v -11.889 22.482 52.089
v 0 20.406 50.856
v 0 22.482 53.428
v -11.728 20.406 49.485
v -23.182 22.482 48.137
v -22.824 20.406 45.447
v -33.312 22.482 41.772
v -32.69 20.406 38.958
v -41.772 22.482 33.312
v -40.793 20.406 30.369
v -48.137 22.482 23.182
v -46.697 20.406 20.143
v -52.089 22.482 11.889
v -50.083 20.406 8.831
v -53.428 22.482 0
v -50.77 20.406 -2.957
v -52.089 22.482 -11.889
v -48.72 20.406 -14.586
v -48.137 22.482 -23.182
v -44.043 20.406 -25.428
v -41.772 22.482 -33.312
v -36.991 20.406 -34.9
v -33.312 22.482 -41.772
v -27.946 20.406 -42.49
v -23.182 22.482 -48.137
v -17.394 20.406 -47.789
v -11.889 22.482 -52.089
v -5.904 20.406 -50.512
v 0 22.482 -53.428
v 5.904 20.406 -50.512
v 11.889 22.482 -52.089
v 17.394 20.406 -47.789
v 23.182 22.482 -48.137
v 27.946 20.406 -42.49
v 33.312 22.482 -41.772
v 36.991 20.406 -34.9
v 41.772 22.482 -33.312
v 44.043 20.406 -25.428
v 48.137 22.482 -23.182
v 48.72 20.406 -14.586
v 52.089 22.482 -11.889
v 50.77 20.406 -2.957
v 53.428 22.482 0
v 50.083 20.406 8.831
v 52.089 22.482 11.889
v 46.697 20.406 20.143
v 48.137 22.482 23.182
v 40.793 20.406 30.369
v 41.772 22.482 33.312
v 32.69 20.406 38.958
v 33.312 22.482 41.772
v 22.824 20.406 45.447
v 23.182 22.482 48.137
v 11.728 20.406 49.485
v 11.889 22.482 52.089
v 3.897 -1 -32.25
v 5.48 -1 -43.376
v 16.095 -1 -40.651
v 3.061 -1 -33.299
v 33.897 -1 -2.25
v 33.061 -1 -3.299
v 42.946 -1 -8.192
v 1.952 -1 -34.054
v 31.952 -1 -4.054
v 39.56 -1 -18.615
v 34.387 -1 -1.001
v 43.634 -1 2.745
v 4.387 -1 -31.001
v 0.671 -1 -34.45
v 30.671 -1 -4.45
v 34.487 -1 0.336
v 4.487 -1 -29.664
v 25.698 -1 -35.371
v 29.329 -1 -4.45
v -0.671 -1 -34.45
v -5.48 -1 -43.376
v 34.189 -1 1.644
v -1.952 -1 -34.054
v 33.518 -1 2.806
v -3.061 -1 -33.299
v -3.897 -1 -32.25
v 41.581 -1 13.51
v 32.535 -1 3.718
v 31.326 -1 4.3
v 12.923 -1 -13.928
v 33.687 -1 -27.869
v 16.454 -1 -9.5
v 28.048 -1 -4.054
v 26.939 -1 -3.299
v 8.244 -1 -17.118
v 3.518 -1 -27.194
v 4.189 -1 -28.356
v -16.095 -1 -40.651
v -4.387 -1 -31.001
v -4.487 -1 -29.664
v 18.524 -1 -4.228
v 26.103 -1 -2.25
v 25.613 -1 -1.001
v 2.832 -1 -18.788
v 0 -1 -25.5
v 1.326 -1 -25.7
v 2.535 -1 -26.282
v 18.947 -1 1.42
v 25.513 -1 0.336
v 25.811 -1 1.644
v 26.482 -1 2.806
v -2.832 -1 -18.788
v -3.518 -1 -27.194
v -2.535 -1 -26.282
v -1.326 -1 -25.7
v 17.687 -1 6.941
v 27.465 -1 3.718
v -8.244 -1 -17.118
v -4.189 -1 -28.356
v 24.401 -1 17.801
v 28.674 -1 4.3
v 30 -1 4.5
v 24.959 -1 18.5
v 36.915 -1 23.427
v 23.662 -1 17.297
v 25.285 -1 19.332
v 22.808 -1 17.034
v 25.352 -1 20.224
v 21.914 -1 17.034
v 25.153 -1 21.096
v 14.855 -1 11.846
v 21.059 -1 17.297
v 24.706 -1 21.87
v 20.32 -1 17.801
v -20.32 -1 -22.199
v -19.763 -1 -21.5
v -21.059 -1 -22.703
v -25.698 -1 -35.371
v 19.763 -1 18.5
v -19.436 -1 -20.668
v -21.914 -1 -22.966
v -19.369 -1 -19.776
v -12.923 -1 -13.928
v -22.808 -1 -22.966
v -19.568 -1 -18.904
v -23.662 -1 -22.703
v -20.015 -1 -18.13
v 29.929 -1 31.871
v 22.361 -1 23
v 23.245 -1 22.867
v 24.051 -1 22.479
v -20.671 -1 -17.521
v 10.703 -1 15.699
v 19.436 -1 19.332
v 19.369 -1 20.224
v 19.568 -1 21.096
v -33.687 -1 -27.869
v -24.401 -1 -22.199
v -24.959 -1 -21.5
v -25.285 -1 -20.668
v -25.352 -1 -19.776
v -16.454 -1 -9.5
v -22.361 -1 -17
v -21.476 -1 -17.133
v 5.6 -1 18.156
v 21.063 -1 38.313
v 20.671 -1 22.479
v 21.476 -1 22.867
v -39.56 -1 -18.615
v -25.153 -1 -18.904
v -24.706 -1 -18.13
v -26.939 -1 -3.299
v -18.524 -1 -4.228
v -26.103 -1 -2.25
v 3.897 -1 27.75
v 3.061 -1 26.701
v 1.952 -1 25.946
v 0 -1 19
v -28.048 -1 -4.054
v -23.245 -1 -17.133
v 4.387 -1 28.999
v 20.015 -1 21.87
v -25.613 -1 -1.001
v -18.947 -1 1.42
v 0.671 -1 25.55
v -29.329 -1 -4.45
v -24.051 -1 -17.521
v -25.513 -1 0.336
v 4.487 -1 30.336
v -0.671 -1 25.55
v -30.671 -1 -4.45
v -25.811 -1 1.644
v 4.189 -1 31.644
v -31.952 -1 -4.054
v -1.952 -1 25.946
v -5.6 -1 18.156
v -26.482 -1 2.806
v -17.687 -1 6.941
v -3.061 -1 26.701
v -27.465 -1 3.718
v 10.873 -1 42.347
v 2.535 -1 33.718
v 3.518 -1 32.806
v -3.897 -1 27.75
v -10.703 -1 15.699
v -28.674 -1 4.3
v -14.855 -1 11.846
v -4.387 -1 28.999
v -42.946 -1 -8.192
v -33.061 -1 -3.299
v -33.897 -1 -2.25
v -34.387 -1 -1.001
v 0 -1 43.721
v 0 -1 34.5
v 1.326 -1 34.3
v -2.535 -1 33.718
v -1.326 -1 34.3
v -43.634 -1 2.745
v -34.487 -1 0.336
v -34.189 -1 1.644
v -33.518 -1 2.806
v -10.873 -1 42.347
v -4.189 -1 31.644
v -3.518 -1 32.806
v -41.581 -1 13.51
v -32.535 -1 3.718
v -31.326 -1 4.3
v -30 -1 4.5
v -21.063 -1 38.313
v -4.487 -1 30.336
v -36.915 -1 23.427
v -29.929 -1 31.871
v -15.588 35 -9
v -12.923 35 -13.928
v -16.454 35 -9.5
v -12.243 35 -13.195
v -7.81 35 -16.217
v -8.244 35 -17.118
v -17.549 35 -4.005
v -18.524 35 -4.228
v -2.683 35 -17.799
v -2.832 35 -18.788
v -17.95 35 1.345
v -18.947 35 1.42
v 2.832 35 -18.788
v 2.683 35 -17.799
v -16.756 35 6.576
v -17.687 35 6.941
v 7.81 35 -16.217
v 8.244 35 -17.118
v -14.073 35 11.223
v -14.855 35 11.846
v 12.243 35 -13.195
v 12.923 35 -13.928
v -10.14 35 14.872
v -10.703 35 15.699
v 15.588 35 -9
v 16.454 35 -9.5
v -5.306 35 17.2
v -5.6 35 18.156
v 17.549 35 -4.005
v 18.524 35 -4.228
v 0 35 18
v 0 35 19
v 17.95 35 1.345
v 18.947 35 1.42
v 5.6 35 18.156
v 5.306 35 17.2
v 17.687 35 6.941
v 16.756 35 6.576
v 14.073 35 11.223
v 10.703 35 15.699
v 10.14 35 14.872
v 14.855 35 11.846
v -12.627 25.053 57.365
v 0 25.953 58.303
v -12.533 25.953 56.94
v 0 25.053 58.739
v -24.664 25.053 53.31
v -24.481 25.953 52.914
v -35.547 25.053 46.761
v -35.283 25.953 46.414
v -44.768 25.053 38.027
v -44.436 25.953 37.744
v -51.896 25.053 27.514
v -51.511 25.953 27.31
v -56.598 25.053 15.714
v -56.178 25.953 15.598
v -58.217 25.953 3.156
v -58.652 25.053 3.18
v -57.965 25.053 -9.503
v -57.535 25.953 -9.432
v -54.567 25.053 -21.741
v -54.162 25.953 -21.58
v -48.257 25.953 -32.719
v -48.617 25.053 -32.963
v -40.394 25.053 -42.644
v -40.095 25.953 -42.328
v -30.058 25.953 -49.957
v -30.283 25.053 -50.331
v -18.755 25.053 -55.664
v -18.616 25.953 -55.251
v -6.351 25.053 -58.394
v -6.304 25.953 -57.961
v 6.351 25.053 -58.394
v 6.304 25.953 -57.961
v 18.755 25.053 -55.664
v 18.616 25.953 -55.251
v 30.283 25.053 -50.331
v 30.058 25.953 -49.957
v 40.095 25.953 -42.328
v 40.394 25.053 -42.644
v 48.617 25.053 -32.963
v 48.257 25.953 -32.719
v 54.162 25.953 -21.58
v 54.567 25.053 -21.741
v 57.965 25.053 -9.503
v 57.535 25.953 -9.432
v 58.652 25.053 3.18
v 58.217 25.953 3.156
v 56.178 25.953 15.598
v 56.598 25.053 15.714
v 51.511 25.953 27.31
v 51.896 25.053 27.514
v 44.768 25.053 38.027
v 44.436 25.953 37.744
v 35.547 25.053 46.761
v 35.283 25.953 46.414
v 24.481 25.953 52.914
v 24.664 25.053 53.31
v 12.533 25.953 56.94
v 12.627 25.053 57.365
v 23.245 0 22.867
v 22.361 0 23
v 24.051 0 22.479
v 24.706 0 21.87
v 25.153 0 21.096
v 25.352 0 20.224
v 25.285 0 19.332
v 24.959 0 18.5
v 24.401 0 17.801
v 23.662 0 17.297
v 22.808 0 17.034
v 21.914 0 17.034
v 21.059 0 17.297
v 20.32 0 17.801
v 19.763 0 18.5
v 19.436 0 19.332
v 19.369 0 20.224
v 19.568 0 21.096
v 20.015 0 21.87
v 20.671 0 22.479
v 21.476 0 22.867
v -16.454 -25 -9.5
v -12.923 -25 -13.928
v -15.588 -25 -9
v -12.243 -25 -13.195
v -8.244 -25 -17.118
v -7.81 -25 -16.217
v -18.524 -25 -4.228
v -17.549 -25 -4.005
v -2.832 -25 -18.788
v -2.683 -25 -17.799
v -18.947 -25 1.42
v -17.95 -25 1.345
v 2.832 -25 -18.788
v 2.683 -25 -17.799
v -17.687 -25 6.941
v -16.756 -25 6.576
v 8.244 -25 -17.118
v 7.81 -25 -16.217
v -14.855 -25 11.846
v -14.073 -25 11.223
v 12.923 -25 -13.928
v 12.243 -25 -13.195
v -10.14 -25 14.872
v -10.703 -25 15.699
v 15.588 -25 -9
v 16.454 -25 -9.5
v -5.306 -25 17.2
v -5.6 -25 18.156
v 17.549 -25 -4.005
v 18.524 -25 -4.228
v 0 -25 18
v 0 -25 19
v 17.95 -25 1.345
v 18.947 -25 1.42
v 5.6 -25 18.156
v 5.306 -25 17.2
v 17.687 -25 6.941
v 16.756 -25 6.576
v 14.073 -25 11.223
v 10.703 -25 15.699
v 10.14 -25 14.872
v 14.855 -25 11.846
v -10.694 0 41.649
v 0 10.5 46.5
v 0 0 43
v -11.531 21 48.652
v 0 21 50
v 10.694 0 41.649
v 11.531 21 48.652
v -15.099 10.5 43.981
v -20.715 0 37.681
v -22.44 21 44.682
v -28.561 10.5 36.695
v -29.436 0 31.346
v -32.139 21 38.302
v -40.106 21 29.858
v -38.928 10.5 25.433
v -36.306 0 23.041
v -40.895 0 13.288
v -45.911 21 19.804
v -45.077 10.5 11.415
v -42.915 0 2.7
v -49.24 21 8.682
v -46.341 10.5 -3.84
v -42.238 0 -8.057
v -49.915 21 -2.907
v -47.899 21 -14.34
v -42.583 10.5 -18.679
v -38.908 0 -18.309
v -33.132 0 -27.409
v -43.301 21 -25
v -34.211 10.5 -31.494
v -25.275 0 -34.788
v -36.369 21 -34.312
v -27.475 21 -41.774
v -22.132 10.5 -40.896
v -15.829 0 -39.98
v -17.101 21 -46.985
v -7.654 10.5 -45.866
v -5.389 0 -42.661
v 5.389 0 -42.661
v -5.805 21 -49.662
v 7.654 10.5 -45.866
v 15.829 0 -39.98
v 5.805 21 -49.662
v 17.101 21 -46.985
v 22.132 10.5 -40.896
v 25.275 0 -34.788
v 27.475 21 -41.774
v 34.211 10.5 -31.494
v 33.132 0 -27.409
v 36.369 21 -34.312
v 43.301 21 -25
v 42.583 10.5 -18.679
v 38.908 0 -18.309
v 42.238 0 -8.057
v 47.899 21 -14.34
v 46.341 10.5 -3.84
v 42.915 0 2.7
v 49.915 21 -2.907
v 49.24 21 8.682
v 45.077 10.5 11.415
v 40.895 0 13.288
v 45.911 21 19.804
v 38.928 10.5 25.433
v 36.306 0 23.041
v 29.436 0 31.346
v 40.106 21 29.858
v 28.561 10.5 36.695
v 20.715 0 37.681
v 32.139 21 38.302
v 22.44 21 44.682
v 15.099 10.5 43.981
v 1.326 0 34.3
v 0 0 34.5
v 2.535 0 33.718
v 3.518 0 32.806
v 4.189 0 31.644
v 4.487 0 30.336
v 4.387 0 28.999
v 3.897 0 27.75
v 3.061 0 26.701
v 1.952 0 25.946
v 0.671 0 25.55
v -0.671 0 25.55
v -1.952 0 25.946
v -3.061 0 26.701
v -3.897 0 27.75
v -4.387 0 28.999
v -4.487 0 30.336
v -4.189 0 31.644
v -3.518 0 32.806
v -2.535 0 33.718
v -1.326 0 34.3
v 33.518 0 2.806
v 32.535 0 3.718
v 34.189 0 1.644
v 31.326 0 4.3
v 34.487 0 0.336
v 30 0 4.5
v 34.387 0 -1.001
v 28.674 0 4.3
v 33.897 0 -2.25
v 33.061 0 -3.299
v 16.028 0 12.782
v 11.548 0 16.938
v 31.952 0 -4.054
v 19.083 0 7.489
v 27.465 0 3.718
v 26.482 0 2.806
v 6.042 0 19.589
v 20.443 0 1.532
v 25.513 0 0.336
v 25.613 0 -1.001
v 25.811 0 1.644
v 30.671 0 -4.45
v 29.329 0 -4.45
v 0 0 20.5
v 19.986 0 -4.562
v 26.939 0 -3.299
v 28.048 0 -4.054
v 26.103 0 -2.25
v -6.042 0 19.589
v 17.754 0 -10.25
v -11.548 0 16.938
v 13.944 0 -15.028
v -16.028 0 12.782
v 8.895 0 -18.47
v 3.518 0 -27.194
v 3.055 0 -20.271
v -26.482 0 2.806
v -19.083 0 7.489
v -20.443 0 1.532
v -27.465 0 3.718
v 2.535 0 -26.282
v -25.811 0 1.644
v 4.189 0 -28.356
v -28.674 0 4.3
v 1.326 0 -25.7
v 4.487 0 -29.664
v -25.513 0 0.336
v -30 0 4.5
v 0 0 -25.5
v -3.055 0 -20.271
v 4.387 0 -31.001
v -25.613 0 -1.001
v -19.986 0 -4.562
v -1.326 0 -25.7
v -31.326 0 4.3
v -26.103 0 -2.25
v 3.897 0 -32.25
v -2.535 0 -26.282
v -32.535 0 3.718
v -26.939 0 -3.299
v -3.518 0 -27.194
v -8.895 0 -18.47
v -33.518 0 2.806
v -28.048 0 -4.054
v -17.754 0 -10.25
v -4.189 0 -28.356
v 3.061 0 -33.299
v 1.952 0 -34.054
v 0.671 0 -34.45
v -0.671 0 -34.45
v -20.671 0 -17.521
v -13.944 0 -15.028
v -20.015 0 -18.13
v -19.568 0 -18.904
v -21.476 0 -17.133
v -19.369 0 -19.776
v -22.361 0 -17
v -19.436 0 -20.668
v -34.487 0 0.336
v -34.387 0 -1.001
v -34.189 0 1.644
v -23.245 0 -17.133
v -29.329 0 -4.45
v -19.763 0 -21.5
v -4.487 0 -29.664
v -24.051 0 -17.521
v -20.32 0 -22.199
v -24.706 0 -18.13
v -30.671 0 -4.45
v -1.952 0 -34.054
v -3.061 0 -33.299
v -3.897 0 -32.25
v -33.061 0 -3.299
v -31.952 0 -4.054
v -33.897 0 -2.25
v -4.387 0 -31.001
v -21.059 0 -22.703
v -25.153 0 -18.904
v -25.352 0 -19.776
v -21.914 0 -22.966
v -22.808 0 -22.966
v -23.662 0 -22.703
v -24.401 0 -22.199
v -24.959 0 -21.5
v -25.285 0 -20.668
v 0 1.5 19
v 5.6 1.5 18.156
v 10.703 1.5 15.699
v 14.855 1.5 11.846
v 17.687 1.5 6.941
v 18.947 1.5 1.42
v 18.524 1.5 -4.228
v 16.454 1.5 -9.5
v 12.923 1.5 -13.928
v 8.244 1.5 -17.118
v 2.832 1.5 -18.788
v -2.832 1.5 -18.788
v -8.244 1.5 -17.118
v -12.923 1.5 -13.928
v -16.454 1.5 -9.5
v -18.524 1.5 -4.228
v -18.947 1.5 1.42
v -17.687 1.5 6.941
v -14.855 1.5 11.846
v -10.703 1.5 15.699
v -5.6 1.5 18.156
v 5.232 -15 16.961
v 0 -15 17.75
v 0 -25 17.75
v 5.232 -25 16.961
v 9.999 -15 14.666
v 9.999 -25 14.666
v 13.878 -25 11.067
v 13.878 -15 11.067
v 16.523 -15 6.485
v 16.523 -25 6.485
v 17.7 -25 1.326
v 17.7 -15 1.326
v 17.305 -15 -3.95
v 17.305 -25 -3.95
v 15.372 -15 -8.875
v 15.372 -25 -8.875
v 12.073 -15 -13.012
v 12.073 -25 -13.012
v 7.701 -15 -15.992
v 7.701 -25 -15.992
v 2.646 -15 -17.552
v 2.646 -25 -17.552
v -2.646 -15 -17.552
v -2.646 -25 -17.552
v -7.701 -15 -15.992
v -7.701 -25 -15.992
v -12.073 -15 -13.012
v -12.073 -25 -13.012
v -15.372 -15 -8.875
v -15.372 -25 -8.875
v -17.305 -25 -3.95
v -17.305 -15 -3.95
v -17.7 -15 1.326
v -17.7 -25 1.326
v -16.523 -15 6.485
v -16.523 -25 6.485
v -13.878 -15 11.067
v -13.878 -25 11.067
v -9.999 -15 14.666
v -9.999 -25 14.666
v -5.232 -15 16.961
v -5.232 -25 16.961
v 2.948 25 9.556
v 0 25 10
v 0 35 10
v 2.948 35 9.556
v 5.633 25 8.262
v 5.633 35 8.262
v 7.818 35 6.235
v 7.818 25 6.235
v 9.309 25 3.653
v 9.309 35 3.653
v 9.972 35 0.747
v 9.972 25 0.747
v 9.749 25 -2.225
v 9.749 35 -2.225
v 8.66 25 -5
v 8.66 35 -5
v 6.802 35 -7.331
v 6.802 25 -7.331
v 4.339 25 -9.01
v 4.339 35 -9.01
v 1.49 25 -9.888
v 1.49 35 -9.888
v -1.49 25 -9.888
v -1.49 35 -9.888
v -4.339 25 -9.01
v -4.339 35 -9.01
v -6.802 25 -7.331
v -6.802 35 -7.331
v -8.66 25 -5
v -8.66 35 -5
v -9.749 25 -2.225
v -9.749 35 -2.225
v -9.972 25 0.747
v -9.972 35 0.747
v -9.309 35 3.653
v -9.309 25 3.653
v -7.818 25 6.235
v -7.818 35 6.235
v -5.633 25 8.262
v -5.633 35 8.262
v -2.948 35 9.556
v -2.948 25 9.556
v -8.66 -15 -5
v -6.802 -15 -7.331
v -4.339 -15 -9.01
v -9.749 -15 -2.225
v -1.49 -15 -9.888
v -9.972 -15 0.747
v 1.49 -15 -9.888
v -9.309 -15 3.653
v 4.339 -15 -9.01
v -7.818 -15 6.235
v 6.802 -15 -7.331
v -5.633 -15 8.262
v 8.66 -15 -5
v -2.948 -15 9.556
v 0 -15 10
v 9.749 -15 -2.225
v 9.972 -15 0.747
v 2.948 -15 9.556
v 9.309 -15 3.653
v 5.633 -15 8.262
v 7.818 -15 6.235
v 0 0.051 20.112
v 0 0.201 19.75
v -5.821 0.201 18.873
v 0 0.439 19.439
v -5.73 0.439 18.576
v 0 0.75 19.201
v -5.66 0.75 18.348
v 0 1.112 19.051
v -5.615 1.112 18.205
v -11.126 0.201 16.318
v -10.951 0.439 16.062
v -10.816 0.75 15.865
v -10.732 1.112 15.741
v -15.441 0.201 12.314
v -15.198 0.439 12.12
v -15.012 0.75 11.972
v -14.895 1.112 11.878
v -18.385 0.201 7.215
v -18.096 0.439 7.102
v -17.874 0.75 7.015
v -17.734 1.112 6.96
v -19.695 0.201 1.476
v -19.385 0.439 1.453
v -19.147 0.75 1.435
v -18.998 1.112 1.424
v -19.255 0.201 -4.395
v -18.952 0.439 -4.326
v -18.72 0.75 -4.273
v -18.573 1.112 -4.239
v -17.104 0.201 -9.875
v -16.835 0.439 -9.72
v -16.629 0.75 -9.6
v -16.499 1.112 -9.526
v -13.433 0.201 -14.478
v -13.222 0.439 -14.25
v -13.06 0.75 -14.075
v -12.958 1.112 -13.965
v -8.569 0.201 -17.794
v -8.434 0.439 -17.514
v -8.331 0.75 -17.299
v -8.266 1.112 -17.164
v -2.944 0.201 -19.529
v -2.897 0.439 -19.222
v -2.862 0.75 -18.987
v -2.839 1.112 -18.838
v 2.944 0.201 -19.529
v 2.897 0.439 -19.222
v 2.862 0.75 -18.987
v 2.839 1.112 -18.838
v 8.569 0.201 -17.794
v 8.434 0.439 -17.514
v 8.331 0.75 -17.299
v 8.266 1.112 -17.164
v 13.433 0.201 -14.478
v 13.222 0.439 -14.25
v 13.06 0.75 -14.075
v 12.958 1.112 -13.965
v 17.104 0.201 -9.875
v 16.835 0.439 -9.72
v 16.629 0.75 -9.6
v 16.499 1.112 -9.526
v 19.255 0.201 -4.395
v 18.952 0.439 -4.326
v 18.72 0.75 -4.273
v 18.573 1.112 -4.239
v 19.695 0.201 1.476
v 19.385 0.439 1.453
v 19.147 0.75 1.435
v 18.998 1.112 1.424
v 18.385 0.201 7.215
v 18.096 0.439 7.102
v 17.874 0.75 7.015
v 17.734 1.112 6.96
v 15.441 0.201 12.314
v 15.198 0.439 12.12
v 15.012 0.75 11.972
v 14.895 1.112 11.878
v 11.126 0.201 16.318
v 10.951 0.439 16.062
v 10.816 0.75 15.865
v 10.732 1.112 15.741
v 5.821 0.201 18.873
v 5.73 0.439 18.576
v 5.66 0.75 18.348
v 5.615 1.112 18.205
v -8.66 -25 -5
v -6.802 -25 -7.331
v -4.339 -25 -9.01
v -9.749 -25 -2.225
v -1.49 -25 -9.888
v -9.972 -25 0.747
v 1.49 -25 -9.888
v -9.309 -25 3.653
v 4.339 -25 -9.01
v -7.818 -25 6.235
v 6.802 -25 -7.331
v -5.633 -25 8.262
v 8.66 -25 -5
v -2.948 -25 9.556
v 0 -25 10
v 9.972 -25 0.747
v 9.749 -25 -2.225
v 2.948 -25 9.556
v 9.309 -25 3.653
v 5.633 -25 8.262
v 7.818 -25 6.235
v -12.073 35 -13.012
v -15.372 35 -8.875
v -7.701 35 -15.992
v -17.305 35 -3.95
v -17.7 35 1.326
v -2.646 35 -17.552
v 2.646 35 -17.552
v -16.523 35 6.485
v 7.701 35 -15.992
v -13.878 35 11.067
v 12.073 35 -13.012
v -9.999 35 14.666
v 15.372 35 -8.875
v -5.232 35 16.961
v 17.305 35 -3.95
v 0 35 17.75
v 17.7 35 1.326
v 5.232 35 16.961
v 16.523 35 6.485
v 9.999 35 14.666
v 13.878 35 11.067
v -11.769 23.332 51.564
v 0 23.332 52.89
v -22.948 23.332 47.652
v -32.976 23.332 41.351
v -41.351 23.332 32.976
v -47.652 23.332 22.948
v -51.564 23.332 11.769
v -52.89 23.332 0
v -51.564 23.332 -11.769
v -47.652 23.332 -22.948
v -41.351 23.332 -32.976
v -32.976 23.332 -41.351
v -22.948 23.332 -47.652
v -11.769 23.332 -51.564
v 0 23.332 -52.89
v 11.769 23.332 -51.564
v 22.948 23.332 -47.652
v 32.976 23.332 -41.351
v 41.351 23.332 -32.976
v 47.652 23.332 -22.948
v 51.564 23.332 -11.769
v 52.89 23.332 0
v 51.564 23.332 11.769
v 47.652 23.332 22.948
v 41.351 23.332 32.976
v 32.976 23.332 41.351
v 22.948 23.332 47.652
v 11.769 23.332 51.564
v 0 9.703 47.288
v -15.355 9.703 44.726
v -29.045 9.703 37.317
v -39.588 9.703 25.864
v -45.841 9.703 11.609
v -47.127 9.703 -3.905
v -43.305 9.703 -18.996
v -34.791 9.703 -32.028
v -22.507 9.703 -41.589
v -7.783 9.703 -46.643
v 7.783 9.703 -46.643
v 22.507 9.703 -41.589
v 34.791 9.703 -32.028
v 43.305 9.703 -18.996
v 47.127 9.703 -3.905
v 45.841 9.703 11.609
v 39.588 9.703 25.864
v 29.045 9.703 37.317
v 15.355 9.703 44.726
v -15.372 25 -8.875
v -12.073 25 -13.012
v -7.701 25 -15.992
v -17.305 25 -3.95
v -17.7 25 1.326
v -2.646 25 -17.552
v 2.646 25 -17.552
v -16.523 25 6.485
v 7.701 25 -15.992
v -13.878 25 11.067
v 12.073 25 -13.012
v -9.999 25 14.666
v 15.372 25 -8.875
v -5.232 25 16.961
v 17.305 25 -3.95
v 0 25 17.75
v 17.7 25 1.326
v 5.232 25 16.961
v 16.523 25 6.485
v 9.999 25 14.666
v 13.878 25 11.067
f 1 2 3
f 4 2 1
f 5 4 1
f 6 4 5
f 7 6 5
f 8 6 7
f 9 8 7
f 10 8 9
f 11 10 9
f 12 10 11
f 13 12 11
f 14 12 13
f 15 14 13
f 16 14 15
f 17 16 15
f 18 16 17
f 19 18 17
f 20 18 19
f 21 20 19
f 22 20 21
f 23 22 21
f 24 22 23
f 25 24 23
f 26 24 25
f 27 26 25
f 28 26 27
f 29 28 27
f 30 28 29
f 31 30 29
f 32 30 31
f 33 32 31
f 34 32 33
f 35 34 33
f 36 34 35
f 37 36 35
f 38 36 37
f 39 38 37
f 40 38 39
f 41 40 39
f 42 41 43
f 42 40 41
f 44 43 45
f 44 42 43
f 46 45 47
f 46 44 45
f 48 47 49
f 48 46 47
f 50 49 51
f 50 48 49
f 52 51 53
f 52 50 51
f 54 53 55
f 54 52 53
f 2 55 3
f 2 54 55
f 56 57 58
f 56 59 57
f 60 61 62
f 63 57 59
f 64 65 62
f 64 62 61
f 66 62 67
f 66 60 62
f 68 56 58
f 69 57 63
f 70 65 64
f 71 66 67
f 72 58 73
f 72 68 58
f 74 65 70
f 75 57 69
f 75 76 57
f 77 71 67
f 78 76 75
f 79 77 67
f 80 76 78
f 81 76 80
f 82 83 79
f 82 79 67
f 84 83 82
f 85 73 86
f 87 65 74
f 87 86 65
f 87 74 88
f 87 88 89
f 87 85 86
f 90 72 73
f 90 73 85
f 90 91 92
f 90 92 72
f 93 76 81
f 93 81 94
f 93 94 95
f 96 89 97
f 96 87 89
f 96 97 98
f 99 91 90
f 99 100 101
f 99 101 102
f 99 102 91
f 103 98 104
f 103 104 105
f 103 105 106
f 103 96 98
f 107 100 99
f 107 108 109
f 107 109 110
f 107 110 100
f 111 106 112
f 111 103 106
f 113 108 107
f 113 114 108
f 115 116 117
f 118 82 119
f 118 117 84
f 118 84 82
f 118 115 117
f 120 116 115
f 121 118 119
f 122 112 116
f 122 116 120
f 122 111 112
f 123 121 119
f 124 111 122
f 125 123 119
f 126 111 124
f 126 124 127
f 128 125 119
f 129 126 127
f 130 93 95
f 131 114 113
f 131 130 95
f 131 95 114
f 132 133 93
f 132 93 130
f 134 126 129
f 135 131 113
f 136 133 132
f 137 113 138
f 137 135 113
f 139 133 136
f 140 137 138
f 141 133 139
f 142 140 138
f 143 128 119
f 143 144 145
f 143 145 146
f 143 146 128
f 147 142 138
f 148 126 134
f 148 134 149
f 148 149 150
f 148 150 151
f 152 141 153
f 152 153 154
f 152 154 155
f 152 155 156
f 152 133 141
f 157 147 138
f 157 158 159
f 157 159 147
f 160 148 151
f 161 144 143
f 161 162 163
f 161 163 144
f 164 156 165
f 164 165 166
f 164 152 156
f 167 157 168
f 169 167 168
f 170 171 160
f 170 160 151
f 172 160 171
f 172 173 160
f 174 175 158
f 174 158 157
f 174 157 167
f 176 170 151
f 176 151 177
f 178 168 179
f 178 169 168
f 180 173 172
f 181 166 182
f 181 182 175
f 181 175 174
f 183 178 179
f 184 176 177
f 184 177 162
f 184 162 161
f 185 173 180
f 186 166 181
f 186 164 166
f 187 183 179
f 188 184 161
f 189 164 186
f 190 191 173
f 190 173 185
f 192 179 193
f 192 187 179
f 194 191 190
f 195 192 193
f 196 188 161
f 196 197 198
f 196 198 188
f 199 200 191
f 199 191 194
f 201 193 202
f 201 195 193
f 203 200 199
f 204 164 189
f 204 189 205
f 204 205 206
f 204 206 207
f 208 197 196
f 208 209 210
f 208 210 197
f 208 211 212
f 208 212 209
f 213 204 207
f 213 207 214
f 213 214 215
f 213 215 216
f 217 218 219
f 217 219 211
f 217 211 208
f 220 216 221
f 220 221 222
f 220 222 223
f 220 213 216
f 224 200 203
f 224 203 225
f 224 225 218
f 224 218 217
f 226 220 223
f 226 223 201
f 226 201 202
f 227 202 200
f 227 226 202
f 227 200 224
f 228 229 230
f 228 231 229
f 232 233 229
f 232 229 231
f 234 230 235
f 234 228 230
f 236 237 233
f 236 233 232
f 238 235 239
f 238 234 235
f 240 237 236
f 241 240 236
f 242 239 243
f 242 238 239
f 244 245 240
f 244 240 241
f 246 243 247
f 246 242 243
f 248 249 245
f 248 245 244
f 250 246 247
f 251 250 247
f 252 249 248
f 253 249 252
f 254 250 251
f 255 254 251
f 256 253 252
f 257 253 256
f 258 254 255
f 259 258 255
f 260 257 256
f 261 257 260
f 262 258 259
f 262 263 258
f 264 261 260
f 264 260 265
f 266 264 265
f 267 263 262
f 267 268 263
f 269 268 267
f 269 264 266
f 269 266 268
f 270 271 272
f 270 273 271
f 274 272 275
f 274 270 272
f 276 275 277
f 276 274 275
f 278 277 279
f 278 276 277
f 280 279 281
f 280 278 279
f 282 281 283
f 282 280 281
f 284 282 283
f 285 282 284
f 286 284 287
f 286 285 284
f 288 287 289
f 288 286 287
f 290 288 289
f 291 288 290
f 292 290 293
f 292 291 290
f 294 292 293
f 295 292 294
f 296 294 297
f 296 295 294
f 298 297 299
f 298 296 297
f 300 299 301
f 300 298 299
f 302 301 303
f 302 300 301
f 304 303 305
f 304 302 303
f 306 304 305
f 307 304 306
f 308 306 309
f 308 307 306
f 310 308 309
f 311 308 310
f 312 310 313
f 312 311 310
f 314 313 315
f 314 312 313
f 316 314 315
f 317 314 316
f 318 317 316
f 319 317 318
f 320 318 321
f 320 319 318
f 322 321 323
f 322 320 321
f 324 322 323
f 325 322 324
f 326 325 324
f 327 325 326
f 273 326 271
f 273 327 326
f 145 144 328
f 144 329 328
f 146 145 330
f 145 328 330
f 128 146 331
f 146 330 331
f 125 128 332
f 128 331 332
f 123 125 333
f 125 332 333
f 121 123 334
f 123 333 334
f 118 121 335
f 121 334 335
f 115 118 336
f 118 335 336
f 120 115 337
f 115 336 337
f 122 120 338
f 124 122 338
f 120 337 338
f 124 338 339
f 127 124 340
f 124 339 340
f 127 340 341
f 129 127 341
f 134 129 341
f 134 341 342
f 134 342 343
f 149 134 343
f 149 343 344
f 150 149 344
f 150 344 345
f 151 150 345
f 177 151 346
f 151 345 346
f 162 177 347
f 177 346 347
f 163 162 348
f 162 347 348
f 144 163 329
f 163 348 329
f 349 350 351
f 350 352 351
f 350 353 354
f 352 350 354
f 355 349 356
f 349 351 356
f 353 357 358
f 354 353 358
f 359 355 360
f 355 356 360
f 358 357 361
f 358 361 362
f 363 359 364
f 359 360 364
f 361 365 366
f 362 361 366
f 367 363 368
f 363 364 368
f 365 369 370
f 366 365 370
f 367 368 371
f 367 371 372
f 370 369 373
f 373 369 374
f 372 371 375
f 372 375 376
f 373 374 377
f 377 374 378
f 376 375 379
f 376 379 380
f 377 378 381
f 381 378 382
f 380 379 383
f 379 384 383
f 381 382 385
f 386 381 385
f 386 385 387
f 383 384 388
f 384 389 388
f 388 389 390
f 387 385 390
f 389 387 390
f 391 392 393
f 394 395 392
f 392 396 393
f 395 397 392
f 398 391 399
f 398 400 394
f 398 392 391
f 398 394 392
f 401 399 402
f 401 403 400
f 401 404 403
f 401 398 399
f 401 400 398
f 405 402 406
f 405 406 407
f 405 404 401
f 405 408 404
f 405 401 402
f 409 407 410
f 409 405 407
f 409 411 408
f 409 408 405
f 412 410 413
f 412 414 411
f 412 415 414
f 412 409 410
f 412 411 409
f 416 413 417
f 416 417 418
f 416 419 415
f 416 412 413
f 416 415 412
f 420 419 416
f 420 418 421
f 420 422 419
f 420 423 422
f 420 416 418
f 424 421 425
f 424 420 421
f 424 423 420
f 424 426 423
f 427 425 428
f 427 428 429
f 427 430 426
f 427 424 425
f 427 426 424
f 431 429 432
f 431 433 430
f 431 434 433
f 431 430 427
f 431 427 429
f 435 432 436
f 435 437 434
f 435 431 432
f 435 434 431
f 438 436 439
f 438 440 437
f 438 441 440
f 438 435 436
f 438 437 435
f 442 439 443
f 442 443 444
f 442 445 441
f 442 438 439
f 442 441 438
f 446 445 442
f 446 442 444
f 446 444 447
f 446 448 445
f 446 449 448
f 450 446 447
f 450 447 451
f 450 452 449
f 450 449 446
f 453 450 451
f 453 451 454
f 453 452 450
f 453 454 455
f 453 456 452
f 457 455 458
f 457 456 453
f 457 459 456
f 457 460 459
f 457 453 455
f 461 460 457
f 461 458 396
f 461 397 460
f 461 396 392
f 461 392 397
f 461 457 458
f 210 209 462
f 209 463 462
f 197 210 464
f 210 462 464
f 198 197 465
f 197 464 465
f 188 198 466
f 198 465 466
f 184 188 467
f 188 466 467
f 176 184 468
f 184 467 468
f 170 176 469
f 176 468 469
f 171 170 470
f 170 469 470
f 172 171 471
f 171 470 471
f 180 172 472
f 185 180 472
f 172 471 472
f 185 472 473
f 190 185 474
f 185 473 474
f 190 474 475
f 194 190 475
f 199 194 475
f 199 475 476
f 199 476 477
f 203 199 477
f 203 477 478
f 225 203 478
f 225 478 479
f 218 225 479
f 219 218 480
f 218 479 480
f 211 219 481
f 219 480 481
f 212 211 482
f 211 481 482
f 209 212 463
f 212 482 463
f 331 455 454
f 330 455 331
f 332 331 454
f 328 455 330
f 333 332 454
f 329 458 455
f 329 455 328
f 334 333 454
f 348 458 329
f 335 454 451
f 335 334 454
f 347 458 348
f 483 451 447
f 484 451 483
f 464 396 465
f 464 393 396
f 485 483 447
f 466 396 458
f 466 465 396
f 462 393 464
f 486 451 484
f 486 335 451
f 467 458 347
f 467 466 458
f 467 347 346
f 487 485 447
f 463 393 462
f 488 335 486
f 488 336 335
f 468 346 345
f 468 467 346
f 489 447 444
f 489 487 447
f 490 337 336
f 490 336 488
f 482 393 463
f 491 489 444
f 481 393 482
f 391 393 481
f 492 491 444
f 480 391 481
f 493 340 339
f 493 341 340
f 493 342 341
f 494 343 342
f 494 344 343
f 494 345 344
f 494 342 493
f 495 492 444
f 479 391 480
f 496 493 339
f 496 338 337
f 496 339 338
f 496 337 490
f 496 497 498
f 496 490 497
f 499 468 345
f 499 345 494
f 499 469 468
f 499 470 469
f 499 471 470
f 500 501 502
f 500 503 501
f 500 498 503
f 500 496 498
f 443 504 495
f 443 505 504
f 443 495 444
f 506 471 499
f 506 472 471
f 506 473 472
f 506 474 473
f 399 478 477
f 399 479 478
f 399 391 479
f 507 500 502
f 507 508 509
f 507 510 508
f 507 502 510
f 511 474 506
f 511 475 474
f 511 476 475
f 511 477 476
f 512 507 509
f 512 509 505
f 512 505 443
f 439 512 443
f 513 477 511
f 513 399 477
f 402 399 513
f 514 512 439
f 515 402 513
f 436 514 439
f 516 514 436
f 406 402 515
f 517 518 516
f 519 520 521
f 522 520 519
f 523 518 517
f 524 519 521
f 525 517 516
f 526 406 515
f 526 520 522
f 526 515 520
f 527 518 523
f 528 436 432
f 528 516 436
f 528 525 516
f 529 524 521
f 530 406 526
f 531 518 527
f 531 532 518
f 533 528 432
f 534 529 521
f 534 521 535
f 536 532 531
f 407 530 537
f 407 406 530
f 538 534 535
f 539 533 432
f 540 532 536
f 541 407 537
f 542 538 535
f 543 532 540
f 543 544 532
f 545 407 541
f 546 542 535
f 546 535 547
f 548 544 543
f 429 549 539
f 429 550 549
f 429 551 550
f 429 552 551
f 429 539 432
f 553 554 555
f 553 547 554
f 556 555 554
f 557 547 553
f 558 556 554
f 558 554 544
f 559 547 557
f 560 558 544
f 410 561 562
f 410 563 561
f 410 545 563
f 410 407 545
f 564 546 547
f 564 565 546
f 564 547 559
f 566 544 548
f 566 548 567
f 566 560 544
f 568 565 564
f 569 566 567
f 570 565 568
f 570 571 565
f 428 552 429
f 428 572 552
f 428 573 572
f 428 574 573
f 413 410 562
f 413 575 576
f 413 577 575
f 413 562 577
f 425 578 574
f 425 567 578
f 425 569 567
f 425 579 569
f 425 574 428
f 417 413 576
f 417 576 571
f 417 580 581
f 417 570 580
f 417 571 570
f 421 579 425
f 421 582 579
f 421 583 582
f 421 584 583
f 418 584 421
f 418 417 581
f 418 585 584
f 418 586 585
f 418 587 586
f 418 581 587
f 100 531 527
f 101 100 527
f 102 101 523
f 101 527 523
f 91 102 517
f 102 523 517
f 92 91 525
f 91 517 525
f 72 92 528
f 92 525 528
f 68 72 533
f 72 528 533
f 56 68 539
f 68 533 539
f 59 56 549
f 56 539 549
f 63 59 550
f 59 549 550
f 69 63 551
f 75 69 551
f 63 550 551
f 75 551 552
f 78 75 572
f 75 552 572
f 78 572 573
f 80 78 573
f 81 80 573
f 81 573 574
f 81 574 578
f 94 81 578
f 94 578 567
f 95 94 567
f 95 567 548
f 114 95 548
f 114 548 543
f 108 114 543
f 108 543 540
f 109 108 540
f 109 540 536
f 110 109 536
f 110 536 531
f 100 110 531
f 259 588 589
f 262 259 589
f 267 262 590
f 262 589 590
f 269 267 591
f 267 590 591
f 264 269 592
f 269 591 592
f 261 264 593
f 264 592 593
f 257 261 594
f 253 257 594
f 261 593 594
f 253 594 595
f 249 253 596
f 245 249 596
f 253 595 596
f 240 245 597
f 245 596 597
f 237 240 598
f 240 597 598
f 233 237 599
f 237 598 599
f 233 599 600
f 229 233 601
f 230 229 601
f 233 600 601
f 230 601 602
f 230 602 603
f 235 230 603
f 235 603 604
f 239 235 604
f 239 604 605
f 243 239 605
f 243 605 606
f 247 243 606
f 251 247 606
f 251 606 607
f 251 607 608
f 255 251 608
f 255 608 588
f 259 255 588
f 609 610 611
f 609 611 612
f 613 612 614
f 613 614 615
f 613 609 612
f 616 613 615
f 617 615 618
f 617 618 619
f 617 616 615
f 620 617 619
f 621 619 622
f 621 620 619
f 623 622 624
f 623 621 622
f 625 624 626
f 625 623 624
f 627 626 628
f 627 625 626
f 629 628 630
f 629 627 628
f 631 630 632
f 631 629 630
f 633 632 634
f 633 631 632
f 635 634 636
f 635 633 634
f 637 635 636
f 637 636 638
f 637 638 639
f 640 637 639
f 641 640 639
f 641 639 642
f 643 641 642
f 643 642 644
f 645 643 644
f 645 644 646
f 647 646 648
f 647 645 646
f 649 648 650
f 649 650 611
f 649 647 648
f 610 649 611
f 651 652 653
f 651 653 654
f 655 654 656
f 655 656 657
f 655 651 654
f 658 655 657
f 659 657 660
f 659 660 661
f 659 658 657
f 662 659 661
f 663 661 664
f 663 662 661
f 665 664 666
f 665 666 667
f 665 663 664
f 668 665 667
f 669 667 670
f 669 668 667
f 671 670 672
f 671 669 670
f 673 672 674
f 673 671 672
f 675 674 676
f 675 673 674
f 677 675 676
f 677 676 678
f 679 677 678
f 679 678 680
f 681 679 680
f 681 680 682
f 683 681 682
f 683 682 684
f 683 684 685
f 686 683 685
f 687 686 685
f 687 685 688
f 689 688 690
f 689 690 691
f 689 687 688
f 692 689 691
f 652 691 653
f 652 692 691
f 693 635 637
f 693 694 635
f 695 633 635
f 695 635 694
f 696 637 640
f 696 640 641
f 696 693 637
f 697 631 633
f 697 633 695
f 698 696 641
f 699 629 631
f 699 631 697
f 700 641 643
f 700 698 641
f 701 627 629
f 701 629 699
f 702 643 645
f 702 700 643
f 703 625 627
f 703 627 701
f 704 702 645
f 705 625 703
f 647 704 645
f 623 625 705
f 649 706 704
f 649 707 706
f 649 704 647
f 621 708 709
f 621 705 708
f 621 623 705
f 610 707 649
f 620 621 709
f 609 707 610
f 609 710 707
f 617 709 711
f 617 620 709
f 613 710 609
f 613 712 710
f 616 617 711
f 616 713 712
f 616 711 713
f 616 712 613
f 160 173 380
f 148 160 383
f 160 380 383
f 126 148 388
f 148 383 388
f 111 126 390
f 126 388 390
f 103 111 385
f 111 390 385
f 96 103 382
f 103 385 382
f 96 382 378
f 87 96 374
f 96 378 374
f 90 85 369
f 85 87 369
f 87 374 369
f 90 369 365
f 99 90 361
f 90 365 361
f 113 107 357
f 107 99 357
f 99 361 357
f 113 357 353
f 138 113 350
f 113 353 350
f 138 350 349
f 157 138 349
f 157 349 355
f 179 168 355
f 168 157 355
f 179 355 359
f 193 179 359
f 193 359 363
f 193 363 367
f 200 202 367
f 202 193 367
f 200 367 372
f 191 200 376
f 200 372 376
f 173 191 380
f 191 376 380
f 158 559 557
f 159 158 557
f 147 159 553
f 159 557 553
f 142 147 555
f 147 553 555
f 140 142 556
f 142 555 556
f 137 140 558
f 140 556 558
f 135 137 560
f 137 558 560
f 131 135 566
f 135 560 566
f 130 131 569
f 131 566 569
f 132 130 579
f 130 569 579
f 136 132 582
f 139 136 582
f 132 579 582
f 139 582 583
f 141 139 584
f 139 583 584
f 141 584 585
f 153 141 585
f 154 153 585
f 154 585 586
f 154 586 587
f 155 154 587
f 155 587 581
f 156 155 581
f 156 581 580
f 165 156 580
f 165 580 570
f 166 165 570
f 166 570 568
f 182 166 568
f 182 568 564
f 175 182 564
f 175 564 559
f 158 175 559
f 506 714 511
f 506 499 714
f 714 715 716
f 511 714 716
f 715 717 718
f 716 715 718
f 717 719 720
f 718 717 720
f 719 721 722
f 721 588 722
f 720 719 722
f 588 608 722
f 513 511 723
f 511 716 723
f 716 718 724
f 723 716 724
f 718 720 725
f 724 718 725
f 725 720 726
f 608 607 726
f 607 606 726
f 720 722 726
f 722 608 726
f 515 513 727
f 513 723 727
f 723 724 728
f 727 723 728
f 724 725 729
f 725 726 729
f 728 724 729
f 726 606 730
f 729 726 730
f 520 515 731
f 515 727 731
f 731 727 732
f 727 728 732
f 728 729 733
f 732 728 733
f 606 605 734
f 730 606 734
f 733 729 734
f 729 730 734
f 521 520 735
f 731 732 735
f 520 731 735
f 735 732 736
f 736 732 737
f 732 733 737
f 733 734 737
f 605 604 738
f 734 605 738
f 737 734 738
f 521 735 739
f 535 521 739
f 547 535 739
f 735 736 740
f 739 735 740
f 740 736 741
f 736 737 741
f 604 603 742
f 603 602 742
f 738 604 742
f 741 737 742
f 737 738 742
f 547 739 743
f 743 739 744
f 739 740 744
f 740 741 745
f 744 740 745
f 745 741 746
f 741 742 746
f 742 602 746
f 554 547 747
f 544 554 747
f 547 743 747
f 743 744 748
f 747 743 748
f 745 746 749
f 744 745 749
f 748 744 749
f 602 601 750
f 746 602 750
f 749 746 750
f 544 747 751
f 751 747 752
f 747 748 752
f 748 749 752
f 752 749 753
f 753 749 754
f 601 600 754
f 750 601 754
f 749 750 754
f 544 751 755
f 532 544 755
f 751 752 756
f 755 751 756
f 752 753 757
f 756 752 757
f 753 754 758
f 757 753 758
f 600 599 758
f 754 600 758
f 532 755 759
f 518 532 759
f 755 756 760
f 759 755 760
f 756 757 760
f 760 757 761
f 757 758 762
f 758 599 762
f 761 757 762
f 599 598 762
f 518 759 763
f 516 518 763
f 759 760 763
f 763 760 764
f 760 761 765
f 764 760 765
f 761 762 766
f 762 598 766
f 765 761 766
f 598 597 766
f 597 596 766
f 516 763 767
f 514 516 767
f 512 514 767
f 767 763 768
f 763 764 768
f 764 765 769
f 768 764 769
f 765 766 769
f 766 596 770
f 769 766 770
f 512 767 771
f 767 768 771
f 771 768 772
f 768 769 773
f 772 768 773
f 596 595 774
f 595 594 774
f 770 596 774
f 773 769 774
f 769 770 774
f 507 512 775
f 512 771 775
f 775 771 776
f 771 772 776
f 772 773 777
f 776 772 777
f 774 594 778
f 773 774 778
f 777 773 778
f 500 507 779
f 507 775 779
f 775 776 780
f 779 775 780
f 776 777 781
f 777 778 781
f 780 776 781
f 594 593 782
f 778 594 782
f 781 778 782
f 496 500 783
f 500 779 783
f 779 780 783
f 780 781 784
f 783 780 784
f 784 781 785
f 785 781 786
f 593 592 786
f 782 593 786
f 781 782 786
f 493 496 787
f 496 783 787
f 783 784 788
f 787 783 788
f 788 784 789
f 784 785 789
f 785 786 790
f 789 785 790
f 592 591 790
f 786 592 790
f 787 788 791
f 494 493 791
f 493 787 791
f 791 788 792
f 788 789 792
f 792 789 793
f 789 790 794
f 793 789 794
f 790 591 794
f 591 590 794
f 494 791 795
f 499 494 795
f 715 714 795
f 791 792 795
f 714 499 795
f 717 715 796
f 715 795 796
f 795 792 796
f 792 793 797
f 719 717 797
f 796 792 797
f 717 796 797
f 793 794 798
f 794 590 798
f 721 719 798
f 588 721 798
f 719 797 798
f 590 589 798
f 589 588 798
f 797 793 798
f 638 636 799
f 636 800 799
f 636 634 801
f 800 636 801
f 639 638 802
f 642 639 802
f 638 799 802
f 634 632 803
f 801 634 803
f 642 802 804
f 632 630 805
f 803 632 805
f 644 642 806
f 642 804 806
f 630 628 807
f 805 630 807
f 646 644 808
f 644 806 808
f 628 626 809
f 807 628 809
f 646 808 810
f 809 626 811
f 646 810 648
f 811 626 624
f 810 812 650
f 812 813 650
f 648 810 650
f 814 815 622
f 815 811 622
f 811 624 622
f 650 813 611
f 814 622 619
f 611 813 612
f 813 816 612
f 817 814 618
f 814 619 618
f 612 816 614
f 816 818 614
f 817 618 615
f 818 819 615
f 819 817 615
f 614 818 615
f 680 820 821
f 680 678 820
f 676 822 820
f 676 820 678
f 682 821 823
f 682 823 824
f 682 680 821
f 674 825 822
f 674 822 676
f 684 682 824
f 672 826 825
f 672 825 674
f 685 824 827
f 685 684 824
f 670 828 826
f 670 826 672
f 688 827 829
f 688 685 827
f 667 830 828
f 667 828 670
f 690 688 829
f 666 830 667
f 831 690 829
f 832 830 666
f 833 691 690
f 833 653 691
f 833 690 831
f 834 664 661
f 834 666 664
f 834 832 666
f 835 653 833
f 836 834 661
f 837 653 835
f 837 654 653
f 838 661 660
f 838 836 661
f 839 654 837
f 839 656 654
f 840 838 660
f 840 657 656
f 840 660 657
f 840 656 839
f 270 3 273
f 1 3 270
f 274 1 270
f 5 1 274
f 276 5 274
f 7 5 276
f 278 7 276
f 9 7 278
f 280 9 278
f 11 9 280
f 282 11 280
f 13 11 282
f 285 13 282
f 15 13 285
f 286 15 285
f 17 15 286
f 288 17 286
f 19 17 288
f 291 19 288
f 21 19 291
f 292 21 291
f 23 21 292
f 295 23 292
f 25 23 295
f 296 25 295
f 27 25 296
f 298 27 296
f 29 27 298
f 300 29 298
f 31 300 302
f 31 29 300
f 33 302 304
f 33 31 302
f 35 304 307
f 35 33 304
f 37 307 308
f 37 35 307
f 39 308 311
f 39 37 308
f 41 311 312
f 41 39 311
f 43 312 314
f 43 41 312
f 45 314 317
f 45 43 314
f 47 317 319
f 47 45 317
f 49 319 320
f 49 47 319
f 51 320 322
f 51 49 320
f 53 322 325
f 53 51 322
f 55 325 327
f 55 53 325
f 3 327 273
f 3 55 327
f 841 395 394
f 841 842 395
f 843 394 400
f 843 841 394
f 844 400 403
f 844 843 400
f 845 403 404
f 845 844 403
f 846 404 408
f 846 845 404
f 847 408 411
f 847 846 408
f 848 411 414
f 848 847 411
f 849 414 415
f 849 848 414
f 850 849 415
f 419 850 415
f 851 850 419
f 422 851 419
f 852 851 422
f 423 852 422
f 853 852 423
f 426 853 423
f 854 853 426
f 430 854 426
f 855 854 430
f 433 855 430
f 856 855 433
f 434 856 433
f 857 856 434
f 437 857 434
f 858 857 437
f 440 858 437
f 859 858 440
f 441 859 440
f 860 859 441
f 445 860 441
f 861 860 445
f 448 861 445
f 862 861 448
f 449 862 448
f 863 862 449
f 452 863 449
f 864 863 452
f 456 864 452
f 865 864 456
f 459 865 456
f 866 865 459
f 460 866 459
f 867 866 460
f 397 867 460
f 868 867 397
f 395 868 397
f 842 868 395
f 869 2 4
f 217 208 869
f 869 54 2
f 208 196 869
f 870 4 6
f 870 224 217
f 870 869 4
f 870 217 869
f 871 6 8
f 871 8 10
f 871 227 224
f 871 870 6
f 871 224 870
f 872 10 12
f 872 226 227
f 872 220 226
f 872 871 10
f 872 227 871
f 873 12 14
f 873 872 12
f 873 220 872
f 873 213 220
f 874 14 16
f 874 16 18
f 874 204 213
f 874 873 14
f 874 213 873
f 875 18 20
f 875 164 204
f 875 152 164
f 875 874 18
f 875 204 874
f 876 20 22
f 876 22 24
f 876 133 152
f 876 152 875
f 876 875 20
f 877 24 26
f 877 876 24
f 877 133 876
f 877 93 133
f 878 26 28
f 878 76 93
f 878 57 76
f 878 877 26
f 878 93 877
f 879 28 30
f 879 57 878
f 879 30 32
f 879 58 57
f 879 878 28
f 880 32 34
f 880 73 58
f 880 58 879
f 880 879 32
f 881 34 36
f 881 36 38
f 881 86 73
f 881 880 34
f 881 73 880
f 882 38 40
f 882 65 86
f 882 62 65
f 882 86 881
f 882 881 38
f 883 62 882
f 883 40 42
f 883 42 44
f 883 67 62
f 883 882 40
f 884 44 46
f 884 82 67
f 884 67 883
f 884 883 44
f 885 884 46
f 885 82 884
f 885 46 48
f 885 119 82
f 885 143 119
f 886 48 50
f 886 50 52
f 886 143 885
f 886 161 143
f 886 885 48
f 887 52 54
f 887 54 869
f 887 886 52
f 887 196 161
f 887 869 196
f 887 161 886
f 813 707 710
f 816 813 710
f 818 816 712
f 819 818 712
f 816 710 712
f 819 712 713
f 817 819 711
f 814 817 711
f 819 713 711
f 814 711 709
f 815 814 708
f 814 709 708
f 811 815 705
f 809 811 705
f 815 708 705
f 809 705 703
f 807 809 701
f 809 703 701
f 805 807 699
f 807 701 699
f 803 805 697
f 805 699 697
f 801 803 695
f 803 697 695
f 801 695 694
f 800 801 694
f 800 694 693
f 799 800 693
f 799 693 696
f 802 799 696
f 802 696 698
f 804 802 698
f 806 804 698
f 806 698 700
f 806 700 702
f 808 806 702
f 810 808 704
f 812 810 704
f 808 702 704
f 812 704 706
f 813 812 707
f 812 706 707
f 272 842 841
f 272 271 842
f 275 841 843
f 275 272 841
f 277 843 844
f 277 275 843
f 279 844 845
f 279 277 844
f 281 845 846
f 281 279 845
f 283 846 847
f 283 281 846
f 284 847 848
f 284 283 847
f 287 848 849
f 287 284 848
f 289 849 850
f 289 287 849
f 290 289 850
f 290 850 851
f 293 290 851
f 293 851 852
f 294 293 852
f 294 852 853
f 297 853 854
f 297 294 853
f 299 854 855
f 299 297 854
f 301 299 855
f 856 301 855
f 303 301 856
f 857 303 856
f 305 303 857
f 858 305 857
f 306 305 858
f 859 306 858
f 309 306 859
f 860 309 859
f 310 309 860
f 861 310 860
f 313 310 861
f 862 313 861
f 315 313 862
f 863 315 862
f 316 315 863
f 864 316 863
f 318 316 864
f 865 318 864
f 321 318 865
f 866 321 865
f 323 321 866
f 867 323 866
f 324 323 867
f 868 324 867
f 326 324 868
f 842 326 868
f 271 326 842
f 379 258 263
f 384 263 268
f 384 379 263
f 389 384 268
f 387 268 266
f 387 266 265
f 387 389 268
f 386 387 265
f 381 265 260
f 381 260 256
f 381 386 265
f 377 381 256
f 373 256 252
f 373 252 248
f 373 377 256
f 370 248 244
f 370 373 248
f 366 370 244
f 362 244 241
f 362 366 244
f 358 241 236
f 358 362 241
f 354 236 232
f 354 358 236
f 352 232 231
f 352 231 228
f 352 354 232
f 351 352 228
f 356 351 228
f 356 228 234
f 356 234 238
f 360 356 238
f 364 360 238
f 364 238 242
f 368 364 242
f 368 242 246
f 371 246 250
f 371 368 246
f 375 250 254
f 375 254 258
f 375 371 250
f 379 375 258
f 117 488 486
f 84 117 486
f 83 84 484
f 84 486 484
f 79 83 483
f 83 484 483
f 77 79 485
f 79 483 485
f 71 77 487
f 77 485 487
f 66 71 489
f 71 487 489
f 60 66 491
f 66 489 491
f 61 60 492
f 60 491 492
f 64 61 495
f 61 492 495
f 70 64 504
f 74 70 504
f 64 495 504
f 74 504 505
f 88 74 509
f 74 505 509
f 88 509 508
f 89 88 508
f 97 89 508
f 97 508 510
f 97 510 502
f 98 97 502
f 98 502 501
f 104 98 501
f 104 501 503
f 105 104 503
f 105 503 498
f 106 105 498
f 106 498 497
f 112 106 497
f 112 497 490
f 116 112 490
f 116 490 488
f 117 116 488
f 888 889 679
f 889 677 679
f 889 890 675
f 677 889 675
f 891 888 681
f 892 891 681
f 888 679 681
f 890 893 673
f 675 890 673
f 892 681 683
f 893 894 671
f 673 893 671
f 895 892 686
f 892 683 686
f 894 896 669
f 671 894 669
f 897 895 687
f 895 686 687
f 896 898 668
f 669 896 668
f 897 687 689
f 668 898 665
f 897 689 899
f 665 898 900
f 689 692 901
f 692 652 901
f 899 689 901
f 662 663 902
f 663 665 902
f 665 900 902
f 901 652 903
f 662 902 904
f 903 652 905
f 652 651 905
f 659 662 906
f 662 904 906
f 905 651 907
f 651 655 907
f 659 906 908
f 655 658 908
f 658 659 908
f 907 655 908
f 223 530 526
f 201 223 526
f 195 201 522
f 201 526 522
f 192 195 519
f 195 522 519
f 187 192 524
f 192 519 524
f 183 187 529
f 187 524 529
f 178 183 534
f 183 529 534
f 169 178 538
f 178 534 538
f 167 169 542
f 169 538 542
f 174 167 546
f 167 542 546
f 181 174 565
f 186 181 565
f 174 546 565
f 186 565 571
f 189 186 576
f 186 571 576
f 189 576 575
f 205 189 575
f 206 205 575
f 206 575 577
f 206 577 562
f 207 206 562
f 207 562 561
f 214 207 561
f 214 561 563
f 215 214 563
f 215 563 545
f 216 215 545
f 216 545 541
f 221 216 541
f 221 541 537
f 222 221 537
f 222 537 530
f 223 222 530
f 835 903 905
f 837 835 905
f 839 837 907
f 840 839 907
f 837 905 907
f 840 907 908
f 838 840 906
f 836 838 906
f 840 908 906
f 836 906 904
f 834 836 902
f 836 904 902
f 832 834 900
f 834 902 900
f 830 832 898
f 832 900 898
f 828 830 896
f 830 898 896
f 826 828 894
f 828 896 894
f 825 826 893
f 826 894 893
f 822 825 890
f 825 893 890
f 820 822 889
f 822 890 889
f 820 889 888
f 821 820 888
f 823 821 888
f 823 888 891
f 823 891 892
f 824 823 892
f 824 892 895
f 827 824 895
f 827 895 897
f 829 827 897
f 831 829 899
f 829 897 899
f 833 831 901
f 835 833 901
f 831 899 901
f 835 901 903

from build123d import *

# Parameters (mm, degrees)
SKETCH_2_R            = 4.5
CUT_EXTRUDE_1_DEPTH   = 40
EXTRUDE_10_DEPTH      = 35
EXTRUDE_10_DEPTH_BACK = 25
SKETCH_3_R            = 19
SKETCH_3_R_2          = 18
FILLET_2_R            = 1.5
EXTRUDE_START         = 25
SKETCH_4_R            = 17.75
SKETCH_4_R_2          = 10
EXTRUDE_11_DEPTH      = 10
EXTRUDE_START_2       = -15
SKETCH_4_2_R          = 17.75
SKETCH_4_2_R_2        = 10
EXTRUDE_12_DEPTH      = 10
SKETCH_6_R            = 3
CUT_EXTRUDE_13_DEPTH  = 15


with BuildPart() as part:
    # Эскиз1 → Повернуть-Тонкостенный1 (revolve)
    with BuildSketch(Plane.XY, mode=Mode.PRIVATE) as revolve_1_sk:
        Polygon((19, 0), (43, 0), (50, 21), (52.889577147, 23.332201276), (58.302767501, 25.953006302), (58.738533119, 25.052946123), (53.42847461, 22.482072549), (50.856038751, 20.405838593), (43.72075922, -1), (19, -1), align=None)
    revolve(revolve_1_sk.sketch.rotate(Axis((0, 0, 0), (0, -1, 0)), 90), axis=Axis((0, 0, 0), (0, -1, 0)))

    # Эскиз2 → Вытянуть1 (cut, symmetric)
    with BuildSketch(Plane(origin=(0, 0, 0), x_dir=(1, 0, 0), z_dir=(0, 1, 0))):
        with Locations(Location((30, 0, 0), (0, 0, 270))):
            Circle(SKETCH_2_R)
        with Locations(Location((-30, 0, 0), (0, 0, 270))):
            Circle(SKETCH_2_R)
        with Locations(Location((0, 30, 0), (0, 0, 270))):
            Circle(SKETCH_2_R)
        with Locations(Location((0, -30, 0), (0, 0, 270))):
            Circle(SKETCH_2_R)
    extrude(amount=CUT_EXTRUDE_1_DEPTH, both=True, mode=Mode.SUBTRACT)

    # Эскиз3 → Вытянуть10 (add, two sides: drawn at the far end of the back side and taken through both)
    with BuildSketch(Plane(origin=(0, 0, 0), x_dir=(1, 0, 0), z_dir=(0, 1, 0)).offset(-EXTRUDE_10_DEPTH_BACK)):
        with Locations(Location((0, 0, 0), (0, 0, 270))):
            Circle(SKETCH_3_R)
        with Locations(Location((0, 0, 0), (0, 0, 270))):
            Circle(SKETCH_3_R_2, mode=Mode.SUBTRACT)
    extrude(amount=EXTRUDE_10_DEPTH + EXTRUDE_10_DEPTH_BACK)

    # Скругление2
    fillet_2_edges = [part.edges().sort_by_distance(p)[0] for p in [
        (0, 0, -19),
    ]]
    fillet(fillet_2_edges, radius=FILLET_2_R)

    # Эскиз6 → Вытянуть13 (cut, symmetric)
    with BuildSketch(Plane(origin=(0, 0, 0), x_dir=(1, 0, 0), z_dir=(0, 1, 0))):
        with Locations(Location((-22.360679775, 20, 0), (0, 0, 270))):
            Circle(SKETCH_6_R)
        with Locations(Location((22.360679775, -20, 0), (0, 0, 270))):
            Circle(SKETCH_6_R)
    extrude(amount=CUT_EXTRUDE_13_DEPTH, both=True, mode=Mode.SUBTRACT)


with BuildPart() as body_2:
    # Эскиз4 → Вытянуть11 (new body)
    with BuildSketch(Plane(origin=(0, 0, 0), x_dir=(1, 0, 0), z_dir=(0, 1, 0)).offset(EXTRUDE_START)):
        with Locations(Location((0, 0, 0), (0, 0, 270))):
            Circle(SKETCH_4_R)
        with Locations(Location((0, 0, 0), (0, 0, 270))):
            Circle(SKETCH_4_R_2, mode=Mode.SUBTRACT)
    extrude(amount=EXTRUDE_11_DEPTH)


with BuildPart() as body_3:
    # Эскиз4<2> → Вытянуть12 (new body)
    with BuildSketch(Plane(origin=(0, 0, 0), x_dir=(1, 0, 0), z_dir=(0, 1, 0)).offset(EXTRUDE_START_2)):
        with Locations(Location((0, 0, 0), (0, 0, 270))):
            Circle(SKETCH_4_2_R)
        with Locations(Location((0, 0, 0), (0, 0, 270))):
            Circle(SKETCH_4_2_R_2, mode=Mode.SUBTRACT)
    extrude(amount=-EXTRUDE_12_DEPTH)


solid = Compound([part.part, body_2.part, body_3.part])
